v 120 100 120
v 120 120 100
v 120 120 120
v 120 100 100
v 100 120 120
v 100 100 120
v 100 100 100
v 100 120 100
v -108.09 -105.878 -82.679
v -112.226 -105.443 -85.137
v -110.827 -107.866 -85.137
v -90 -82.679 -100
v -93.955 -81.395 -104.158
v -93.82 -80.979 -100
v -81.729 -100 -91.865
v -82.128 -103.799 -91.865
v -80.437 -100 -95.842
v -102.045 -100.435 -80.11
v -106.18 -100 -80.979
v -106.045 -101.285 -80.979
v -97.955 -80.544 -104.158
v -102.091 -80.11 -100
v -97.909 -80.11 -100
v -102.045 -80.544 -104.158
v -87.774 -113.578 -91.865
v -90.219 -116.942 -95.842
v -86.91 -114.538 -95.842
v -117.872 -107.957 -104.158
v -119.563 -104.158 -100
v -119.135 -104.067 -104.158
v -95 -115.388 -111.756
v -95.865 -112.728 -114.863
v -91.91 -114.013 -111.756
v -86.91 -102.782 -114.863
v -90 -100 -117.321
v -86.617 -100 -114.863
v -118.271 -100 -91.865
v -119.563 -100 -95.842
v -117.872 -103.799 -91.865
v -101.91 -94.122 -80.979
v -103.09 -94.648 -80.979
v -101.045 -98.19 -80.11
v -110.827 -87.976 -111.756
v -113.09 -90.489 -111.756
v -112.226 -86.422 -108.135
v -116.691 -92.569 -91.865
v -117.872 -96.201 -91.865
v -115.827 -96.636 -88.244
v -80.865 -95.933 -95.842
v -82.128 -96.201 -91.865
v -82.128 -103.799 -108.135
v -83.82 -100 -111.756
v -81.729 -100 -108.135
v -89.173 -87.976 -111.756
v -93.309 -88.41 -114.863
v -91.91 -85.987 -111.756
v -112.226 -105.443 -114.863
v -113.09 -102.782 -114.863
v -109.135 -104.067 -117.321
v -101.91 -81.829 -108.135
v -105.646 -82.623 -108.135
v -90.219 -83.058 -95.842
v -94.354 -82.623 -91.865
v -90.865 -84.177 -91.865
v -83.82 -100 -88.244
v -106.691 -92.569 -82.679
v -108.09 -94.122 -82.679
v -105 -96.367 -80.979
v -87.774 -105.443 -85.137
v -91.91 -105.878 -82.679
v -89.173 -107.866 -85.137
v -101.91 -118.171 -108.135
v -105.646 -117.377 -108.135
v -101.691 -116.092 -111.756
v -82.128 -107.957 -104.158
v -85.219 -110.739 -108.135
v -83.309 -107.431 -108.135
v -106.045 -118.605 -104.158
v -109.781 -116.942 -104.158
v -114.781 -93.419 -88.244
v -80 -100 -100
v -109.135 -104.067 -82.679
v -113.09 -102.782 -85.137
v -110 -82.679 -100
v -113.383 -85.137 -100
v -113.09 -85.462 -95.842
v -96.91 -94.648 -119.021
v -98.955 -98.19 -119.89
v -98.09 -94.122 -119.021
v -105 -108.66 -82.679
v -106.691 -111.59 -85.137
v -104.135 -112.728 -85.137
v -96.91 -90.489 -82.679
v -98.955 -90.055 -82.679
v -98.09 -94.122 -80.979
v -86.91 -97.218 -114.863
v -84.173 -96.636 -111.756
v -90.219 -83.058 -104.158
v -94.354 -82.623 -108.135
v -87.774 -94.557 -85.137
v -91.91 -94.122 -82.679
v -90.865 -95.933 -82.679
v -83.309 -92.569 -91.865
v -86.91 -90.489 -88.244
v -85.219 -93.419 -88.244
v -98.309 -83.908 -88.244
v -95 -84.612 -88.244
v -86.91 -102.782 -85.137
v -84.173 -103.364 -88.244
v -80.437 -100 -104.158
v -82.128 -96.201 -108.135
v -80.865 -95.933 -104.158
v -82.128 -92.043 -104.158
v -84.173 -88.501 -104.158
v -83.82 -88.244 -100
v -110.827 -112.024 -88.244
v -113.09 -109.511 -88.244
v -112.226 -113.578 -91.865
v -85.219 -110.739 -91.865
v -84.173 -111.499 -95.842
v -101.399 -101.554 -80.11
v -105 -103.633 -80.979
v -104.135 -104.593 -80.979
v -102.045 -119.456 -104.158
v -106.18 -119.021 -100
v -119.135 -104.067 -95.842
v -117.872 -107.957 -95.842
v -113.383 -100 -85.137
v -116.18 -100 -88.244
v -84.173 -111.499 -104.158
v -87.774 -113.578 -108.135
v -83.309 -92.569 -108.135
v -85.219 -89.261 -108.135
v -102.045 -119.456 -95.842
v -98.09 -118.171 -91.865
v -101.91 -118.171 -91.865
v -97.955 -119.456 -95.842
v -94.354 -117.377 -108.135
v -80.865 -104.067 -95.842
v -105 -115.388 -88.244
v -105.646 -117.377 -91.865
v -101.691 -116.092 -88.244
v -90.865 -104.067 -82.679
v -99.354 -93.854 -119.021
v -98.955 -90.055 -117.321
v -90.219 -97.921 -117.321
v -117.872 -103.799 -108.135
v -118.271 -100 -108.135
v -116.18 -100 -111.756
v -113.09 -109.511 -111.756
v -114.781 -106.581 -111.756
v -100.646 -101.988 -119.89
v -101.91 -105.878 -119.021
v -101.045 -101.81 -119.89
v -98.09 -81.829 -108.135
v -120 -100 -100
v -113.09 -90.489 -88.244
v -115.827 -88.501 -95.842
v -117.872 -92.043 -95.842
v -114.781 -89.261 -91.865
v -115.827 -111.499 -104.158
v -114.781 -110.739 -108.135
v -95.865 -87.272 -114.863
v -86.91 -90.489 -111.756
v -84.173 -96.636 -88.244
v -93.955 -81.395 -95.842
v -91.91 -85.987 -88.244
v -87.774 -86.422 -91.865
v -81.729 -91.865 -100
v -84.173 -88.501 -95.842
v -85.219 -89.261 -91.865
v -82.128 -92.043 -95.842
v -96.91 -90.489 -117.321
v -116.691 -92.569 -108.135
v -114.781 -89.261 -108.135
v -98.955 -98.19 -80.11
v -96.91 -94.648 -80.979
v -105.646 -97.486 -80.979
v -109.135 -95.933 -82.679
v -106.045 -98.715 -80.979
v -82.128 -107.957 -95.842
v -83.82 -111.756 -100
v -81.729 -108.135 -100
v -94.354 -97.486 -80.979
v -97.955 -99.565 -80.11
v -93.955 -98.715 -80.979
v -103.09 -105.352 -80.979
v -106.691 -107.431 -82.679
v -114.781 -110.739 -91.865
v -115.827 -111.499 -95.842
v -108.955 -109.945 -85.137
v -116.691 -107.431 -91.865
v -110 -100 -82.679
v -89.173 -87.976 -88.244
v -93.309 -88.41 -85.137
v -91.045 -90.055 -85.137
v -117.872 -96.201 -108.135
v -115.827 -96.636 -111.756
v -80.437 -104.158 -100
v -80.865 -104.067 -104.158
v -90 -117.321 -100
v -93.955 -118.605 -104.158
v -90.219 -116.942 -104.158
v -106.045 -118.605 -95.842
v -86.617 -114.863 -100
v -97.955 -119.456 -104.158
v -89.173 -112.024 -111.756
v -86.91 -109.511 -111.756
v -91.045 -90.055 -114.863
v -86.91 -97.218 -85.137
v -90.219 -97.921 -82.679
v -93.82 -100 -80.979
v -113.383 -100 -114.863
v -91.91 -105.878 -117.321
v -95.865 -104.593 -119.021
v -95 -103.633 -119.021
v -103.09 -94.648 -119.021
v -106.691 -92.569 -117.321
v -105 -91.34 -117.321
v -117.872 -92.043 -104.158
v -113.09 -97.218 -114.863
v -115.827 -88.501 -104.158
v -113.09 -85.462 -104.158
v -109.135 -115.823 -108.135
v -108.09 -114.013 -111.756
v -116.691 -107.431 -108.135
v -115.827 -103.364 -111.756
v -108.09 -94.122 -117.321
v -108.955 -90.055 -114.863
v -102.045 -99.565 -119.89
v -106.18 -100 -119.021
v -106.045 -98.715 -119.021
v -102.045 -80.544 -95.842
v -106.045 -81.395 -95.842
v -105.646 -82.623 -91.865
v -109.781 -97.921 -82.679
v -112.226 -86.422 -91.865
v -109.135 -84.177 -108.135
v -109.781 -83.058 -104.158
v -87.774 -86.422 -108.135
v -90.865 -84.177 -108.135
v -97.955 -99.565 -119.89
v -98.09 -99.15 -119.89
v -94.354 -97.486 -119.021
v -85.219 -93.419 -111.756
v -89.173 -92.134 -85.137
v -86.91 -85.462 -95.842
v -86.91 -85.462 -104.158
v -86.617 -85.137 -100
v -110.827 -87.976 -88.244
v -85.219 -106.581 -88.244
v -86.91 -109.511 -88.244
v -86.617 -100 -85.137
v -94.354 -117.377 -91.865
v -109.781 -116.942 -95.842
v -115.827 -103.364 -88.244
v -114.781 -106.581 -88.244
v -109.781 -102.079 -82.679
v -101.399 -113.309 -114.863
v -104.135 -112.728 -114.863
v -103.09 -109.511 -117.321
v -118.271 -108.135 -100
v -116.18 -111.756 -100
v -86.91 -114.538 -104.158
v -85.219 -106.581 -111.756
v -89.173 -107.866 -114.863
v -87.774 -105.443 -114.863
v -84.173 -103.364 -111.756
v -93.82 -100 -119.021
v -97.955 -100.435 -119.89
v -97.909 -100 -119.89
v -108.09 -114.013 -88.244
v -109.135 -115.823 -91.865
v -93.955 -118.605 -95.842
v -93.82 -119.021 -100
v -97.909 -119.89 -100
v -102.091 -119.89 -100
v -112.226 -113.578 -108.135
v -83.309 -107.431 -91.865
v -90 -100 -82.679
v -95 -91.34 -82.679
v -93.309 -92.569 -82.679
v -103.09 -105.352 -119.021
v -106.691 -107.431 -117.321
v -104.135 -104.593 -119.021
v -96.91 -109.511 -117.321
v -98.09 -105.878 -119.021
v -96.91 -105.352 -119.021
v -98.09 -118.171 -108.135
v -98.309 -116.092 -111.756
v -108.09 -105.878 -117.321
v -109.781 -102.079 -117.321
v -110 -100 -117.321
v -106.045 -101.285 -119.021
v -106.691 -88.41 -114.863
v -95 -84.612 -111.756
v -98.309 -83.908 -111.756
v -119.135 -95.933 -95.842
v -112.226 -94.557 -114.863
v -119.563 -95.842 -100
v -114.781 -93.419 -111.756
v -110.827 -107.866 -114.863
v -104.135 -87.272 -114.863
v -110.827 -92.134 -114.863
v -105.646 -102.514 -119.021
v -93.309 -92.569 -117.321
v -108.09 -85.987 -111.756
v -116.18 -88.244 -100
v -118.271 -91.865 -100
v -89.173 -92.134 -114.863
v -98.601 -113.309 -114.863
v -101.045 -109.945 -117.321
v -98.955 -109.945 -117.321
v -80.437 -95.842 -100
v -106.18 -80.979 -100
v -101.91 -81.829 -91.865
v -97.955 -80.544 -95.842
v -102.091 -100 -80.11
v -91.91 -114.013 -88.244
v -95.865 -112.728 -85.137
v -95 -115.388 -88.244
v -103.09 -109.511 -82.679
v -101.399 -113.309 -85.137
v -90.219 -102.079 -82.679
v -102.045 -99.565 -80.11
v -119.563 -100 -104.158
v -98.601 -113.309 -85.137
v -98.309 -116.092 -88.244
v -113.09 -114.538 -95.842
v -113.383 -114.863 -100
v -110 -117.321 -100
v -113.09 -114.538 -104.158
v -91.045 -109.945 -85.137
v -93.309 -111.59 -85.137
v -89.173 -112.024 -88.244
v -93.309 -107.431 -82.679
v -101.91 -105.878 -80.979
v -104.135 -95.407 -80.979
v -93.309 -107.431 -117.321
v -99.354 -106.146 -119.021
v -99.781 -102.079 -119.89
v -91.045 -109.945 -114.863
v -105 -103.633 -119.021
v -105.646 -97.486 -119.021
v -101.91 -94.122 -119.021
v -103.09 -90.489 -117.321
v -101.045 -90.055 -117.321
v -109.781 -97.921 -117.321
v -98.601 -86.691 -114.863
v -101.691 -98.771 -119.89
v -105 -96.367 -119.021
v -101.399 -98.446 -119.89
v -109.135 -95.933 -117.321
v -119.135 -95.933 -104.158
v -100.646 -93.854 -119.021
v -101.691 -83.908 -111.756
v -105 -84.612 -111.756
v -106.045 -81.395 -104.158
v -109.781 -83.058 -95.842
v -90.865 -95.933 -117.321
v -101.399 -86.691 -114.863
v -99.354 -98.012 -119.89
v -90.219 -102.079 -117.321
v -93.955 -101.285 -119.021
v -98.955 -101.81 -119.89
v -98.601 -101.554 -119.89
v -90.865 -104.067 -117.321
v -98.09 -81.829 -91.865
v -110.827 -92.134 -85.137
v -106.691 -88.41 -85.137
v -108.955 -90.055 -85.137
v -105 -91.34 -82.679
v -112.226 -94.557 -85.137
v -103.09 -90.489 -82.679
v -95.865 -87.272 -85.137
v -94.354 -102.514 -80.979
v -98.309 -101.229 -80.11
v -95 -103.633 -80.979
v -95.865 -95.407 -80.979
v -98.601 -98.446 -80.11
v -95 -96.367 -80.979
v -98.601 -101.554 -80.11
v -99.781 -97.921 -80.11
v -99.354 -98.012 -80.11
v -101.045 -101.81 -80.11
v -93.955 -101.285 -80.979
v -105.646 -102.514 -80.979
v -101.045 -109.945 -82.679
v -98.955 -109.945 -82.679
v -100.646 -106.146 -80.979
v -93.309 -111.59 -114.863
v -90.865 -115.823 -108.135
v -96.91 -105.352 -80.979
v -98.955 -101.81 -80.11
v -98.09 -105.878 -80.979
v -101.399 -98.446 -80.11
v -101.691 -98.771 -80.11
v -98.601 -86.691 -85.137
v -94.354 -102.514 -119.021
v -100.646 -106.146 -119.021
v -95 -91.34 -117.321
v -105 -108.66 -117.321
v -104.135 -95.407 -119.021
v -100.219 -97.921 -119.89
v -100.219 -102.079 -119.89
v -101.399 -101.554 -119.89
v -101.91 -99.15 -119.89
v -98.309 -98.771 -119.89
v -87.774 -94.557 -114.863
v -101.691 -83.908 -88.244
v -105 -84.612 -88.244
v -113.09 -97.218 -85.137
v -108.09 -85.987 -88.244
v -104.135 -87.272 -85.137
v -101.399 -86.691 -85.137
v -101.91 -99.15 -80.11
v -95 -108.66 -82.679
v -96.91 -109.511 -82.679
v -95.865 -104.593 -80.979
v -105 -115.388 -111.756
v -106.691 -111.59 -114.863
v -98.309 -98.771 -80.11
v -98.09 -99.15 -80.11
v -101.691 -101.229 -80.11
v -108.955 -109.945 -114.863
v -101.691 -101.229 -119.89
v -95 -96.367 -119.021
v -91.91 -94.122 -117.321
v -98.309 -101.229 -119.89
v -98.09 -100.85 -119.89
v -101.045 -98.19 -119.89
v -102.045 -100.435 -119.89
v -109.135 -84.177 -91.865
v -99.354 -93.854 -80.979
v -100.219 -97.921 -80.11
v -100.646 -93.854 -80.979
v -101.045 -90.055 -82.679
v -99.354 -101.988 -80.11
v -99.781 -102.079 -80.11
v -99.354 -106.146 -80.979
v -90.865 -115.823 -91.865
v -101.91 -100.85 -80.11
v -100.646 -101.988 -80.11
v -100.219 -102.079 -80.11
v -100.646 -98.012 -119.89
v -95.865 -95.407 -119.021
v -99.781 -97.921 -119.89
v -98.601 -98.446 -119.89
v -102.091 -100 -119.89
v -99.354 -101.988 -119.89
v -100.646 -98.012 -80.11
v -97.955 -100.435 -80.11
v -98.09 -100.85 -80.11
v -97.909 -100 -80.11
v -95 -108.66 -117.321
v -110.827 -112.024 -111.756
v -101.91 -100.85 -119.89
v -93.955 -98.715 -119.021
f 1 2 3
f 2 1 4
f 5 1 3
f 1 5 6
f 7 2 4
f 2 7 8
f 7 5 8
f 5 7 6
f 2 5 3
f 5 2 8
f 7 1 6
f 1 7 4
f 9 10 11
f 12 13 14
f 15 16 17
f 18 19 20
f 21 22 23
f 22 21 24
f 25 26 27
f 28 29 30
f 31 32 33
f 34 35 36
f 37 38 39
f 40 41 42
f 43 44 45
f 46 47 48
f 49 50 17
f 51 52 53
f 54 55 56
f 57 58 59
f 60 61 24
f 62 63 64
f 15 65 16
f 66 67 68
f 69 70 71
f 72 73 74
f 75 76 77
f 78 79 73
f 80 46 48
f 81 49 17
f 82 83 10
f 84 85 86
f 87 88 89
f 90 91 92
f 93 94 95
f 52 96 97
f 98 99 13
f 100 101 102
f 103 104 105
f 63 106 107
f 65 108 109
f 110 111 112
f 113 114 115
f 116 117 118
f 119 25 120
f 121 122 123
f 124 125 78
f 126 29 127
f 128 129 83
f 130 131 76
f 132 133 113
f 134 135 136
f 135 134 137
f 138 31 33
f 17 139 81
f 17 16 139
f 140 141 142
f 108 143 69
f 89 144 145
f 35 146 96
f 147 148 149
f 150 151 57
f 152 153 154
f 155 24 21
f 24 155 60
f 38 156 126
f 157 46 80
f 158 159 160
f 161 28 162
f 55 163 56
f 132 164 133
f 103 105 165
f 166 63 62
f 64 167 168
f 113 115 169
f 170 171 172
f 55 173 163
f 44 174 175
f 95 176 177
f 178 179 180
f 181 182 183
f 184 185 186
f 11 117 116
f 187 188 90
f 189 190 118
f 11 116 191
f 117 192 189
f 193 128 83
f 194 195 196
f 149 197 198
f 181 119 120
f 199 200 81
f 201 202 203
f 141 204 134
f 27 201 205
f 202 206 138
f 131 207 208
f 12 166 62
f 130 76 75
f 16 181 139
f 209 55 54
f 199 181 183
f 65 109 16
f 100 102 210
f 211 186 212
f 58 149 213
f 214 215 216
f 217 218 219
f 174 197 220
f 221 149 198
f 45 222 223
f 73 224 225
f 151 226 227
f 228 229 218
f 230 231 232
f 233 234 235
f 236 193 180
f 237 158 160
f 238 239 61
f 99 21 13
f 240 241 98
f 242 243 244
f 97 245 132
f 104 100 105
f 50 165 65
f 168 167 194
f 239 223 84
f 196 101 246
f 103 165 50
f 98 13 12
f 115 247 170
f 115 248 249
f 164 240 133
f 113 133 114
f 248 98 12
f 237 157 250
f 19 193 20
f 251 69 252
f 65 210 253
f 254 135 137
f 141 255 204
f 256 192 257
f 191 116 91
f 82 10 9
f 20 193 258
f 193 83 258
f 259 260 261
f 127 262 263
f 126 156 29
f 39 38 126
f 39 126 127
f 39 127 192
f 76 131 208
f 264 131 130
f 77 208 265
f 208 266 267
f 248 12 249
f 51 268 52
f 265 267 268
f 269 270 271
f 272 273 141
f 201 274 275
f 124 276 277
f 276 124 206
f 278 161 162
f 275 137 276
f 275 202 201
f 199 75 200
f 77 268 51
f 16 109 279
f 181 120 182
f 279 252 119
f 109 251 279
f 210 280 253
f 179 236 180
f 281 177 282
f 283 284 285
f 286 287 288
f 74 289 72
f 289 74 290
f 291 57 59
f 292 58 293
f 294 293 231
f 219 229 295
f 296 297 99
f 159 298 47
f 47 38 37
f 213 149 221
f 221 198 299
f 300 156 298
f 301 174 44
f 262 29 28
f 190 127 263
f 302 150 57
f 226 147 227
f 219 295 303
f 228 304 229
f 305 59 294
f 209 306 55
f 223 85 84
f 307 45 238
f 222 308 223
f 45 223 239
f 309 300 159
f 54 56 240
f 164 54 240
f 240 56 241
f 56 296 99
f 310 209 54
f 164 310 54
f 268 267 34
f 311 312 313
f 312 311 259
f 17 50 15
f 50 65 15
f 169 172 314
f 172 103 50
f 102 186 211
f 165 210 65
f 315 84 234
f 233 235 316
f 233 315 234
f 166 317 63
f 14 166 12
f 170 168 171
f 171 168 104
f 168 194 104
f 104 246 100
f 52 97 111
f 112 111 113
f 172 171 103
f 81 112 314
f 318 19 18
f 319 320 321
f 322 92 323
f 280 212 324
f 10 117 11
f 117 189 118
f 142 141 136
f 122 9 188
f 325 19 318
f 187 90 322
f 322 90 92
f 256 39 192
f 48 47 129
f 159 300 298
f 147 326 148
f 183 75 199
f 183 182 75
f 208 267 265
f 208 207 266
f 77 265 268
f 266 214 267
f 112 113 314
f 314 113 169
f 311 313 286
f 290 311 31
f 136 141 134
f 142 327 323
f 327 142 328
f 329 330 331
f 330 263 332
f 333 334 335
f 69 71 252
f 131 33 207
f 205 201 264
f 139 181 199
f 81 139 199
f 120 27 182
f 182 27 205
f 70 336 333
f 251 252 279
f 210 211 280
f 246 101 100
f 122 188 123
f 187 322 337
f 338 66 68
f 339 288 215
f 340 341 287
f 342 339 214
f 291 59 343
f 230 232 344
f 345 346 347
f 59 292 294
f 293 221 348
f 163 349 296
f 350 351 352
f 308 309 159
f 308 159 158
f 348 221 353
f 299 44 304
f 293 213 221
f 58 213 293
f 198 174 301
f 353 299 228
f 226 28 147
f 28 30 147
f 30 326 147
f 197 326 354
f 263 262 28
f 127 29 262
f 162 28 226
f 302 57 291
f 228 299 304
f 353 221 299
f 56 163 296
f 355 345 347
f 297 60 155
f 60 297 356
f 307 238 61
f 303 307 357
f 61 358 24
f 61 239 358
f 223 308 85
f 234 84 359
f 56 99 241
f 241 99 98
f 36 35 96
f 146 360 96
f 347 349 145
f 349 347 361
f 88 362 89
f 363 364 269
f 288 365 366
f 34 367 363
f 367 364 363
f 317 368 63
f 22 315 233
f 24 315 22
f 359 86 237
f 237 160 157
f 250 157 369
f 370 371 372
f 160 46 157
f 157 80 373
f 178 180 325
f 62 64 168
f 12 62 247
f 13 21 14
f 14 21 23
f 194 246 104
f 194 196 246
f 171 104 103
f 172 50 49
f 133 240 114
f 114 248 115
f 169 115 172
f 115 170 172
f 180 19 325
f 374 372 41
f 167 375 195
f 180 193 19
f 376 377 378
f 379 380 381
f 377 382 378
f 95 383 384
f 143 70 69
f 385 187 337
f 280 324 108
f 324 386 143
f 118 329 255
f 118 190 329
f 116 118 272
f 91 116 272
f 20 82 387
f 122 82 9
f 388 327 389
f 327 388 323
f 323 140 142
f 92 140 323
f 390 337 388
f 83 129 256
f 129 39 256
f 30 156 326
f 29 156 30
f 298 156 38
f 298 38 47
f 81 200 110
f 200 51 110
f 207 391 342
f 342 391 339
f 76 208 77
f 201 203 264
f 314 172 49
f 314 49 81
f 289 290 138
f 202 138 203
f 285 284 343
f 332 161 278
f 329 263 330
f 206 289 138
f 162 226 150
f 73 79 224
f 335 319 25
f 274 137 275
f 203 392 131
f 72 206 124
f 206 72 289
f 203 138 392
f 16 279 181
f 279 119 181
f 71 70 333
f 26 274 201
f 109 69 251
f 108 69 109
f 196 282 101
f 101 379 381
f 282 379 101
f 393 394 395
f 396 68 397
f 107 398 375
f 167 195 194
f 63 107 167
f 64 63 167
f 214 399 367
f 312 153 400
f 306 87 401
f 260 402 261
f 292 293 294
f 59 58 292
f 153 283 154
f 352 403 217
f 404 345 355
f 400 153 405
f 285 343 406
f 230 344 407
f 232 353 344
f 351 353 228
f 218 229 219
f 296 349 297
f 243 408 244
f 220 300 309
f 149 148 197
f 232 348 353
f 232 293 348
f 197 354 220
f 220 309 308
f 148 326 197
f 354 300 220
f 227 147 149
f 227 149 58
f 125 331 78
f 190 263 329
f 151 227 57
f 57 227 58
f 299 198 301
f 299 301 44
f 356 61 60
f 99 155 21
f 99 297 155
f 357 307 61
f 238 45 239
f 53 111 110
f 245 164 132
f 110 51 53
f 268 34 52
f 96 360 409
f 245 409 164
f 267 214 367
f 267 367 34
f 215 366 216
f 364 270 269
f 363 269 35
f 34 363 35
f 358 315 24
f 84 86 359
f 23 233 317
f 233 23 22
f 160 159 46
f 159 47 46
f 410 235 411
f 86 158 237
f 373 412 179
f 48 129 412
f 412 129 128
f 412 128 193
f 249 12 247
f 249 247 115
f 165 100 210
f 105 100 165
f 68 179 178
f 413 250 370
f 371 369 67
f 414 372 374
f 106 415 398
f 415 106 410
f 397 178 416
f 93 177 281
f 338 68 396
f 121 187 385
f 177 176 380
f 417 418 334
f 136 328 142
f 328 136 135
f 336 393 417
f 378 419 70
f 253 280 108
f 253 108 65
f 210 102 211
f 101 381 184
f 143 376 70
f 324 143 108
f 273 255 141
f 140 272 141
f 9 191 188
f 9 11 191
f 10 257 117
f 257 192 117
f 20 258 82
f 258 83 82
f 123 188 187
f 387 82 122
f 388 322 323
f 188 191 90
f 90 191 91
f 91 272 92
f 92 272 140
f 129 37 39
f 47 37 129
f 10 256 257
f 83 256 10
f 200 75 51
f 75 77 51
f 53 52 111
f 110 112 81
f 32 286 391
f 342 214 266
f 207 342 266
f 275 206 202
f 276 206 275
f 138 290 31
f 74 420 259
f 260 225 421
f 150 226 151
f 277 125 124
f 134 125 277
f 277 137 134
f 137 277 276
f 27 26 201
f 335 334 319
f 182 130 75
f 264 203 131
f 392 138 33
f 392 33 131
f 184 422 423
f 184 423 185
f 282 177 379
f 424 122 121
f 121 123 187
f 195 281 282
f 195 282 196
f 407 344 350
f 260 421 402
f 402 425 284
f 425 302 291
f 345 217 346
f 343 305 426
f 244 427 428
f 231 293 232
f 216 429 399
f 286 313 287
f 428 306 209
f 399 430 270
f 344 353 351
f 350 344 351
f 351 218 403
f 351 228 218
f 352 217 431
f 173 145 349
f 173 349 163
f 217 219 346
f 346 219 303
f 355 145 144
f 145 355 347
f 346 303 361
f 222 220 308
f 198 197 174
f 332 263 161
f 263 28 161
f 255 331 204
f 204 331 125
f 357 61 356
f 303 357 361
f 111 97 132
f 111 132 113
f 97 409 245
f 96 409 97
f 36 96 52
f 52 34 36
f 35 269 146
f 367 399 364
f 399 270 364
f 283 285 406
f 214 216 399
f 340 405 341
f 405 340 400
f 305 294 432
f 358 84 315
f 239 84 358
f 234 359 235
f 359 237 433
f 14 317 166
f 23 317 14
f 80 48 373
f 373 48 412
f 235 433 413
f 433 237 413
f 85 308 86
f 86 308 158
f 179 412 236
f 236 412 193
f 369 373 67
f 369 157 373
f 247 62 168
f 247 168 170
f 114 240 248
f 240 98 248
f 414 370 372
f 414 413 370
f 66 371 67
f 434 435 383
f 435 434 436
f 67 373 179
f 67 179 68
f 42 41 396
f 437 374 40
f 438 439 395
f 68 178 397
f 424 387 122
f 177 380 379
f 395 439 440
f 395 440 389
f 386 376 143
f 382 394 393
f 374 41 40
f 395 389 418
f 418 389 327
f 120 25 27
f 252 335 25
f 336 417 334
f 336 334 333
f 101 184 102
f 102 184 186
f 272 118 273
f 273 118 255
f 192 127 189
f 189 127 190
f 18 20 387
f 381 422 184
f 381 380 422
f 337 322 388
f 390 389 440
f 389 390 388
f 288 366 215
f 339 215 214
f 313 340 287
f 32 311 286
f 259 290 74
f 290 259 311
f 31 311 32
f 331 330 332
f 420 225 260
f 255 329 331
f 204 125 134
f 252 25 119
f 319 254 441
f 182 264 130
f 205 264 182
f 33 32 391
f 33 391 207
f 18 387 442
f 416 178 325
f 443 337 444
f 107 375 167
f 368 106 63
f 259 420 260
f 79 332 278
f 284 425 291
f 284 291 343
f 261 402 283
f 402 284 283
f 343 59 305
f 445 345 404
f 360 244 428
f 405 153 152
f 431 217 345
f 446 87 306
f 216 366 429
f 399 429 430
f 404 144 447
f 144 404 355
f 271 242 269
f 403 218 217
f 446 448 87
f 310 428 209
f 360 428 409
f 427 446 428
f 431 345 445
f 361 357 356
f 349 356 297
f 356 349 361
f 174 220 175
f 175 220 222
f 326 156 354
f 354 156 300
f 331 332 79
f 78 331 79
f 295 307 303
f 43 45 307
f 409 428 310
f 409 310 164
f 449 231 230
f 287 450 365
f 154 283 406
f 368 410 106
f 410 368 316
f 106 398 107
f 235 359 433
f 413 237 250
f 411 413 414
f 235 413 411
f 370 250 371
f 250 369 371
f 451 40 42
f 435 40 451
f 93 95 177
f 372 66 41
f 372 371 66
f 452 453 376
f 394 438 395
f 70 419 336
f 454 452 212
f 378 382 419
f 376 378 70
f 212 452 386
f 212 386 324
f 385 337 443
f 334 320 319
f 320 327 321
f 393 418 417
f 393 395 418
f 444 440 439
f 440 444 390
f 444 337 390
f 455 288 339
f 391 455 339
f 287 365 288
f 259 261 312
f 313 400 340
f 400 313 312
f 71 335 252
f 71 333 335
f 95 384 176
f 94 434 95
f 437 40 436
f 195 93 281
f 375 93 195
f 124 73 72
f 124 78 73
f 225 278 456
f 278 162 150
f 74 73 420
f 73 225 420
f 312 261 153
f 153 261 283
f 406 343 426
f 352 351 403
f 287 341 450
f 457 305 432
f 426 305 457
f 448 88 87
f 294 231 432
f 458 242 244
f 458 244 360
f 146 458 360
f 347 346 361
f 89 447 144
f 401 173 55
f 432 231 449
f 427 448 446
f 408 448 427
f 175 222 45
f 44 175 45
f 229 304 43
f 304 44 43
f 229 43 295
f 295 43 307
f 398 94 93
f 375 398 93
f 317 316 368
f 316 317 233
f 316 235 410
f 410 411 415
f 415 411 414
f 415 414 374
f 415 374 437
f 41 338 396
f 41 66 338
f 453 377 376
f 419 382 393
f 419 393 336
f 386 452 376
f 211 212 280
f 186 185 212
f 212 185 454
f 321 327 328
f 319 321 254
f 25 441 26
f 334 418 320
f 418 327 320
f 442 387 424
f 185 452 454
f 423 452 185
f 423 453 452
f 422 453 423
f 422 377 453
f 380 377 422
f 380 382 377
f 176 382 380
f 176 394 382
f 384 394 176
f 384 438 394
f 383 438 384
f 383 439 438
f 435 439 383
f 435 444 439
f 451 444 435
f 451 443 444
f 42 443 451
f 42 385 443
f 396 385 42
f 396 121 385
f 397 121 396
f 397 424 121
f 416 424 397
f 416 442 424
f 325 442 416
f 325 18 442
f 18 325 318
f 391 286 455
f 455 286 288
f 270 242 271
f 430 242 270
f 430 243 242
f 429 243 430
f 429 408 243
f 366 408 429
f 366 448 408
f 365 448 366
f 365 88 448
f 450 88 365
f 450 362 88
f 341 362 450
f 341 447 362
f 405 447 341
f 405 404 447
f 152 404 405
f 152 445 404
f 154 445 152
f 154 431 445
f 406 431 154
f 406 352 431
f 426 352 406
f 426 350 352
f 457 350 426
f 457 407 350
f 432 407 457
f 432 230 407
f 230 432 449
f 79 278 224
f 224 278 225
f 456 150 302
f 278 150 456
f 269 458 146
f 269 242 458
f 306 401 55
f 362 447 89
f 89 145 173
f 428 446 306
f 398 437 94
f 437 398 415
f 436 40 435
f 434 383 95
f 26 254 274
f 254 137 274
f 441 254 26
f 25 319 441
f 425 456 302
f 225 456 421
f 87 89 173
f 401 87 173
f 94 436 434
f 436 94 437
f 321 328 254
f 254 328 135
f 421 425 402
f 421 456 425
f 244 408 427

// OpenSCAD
//this is where the magic happens
difference()
{

linear_extrude(height = 100, center = true, $fn=300)
   import(file = "popp.dxf", layer = "0");
//next step.

linear_extrude(height = 100, center = true, $fn=300)
   import(file = "popp.dxf", layer = "pop");
    
}


translate([100,100,100])
  cube(20);

translate([-100,-100,-100])
  sphere(20);
